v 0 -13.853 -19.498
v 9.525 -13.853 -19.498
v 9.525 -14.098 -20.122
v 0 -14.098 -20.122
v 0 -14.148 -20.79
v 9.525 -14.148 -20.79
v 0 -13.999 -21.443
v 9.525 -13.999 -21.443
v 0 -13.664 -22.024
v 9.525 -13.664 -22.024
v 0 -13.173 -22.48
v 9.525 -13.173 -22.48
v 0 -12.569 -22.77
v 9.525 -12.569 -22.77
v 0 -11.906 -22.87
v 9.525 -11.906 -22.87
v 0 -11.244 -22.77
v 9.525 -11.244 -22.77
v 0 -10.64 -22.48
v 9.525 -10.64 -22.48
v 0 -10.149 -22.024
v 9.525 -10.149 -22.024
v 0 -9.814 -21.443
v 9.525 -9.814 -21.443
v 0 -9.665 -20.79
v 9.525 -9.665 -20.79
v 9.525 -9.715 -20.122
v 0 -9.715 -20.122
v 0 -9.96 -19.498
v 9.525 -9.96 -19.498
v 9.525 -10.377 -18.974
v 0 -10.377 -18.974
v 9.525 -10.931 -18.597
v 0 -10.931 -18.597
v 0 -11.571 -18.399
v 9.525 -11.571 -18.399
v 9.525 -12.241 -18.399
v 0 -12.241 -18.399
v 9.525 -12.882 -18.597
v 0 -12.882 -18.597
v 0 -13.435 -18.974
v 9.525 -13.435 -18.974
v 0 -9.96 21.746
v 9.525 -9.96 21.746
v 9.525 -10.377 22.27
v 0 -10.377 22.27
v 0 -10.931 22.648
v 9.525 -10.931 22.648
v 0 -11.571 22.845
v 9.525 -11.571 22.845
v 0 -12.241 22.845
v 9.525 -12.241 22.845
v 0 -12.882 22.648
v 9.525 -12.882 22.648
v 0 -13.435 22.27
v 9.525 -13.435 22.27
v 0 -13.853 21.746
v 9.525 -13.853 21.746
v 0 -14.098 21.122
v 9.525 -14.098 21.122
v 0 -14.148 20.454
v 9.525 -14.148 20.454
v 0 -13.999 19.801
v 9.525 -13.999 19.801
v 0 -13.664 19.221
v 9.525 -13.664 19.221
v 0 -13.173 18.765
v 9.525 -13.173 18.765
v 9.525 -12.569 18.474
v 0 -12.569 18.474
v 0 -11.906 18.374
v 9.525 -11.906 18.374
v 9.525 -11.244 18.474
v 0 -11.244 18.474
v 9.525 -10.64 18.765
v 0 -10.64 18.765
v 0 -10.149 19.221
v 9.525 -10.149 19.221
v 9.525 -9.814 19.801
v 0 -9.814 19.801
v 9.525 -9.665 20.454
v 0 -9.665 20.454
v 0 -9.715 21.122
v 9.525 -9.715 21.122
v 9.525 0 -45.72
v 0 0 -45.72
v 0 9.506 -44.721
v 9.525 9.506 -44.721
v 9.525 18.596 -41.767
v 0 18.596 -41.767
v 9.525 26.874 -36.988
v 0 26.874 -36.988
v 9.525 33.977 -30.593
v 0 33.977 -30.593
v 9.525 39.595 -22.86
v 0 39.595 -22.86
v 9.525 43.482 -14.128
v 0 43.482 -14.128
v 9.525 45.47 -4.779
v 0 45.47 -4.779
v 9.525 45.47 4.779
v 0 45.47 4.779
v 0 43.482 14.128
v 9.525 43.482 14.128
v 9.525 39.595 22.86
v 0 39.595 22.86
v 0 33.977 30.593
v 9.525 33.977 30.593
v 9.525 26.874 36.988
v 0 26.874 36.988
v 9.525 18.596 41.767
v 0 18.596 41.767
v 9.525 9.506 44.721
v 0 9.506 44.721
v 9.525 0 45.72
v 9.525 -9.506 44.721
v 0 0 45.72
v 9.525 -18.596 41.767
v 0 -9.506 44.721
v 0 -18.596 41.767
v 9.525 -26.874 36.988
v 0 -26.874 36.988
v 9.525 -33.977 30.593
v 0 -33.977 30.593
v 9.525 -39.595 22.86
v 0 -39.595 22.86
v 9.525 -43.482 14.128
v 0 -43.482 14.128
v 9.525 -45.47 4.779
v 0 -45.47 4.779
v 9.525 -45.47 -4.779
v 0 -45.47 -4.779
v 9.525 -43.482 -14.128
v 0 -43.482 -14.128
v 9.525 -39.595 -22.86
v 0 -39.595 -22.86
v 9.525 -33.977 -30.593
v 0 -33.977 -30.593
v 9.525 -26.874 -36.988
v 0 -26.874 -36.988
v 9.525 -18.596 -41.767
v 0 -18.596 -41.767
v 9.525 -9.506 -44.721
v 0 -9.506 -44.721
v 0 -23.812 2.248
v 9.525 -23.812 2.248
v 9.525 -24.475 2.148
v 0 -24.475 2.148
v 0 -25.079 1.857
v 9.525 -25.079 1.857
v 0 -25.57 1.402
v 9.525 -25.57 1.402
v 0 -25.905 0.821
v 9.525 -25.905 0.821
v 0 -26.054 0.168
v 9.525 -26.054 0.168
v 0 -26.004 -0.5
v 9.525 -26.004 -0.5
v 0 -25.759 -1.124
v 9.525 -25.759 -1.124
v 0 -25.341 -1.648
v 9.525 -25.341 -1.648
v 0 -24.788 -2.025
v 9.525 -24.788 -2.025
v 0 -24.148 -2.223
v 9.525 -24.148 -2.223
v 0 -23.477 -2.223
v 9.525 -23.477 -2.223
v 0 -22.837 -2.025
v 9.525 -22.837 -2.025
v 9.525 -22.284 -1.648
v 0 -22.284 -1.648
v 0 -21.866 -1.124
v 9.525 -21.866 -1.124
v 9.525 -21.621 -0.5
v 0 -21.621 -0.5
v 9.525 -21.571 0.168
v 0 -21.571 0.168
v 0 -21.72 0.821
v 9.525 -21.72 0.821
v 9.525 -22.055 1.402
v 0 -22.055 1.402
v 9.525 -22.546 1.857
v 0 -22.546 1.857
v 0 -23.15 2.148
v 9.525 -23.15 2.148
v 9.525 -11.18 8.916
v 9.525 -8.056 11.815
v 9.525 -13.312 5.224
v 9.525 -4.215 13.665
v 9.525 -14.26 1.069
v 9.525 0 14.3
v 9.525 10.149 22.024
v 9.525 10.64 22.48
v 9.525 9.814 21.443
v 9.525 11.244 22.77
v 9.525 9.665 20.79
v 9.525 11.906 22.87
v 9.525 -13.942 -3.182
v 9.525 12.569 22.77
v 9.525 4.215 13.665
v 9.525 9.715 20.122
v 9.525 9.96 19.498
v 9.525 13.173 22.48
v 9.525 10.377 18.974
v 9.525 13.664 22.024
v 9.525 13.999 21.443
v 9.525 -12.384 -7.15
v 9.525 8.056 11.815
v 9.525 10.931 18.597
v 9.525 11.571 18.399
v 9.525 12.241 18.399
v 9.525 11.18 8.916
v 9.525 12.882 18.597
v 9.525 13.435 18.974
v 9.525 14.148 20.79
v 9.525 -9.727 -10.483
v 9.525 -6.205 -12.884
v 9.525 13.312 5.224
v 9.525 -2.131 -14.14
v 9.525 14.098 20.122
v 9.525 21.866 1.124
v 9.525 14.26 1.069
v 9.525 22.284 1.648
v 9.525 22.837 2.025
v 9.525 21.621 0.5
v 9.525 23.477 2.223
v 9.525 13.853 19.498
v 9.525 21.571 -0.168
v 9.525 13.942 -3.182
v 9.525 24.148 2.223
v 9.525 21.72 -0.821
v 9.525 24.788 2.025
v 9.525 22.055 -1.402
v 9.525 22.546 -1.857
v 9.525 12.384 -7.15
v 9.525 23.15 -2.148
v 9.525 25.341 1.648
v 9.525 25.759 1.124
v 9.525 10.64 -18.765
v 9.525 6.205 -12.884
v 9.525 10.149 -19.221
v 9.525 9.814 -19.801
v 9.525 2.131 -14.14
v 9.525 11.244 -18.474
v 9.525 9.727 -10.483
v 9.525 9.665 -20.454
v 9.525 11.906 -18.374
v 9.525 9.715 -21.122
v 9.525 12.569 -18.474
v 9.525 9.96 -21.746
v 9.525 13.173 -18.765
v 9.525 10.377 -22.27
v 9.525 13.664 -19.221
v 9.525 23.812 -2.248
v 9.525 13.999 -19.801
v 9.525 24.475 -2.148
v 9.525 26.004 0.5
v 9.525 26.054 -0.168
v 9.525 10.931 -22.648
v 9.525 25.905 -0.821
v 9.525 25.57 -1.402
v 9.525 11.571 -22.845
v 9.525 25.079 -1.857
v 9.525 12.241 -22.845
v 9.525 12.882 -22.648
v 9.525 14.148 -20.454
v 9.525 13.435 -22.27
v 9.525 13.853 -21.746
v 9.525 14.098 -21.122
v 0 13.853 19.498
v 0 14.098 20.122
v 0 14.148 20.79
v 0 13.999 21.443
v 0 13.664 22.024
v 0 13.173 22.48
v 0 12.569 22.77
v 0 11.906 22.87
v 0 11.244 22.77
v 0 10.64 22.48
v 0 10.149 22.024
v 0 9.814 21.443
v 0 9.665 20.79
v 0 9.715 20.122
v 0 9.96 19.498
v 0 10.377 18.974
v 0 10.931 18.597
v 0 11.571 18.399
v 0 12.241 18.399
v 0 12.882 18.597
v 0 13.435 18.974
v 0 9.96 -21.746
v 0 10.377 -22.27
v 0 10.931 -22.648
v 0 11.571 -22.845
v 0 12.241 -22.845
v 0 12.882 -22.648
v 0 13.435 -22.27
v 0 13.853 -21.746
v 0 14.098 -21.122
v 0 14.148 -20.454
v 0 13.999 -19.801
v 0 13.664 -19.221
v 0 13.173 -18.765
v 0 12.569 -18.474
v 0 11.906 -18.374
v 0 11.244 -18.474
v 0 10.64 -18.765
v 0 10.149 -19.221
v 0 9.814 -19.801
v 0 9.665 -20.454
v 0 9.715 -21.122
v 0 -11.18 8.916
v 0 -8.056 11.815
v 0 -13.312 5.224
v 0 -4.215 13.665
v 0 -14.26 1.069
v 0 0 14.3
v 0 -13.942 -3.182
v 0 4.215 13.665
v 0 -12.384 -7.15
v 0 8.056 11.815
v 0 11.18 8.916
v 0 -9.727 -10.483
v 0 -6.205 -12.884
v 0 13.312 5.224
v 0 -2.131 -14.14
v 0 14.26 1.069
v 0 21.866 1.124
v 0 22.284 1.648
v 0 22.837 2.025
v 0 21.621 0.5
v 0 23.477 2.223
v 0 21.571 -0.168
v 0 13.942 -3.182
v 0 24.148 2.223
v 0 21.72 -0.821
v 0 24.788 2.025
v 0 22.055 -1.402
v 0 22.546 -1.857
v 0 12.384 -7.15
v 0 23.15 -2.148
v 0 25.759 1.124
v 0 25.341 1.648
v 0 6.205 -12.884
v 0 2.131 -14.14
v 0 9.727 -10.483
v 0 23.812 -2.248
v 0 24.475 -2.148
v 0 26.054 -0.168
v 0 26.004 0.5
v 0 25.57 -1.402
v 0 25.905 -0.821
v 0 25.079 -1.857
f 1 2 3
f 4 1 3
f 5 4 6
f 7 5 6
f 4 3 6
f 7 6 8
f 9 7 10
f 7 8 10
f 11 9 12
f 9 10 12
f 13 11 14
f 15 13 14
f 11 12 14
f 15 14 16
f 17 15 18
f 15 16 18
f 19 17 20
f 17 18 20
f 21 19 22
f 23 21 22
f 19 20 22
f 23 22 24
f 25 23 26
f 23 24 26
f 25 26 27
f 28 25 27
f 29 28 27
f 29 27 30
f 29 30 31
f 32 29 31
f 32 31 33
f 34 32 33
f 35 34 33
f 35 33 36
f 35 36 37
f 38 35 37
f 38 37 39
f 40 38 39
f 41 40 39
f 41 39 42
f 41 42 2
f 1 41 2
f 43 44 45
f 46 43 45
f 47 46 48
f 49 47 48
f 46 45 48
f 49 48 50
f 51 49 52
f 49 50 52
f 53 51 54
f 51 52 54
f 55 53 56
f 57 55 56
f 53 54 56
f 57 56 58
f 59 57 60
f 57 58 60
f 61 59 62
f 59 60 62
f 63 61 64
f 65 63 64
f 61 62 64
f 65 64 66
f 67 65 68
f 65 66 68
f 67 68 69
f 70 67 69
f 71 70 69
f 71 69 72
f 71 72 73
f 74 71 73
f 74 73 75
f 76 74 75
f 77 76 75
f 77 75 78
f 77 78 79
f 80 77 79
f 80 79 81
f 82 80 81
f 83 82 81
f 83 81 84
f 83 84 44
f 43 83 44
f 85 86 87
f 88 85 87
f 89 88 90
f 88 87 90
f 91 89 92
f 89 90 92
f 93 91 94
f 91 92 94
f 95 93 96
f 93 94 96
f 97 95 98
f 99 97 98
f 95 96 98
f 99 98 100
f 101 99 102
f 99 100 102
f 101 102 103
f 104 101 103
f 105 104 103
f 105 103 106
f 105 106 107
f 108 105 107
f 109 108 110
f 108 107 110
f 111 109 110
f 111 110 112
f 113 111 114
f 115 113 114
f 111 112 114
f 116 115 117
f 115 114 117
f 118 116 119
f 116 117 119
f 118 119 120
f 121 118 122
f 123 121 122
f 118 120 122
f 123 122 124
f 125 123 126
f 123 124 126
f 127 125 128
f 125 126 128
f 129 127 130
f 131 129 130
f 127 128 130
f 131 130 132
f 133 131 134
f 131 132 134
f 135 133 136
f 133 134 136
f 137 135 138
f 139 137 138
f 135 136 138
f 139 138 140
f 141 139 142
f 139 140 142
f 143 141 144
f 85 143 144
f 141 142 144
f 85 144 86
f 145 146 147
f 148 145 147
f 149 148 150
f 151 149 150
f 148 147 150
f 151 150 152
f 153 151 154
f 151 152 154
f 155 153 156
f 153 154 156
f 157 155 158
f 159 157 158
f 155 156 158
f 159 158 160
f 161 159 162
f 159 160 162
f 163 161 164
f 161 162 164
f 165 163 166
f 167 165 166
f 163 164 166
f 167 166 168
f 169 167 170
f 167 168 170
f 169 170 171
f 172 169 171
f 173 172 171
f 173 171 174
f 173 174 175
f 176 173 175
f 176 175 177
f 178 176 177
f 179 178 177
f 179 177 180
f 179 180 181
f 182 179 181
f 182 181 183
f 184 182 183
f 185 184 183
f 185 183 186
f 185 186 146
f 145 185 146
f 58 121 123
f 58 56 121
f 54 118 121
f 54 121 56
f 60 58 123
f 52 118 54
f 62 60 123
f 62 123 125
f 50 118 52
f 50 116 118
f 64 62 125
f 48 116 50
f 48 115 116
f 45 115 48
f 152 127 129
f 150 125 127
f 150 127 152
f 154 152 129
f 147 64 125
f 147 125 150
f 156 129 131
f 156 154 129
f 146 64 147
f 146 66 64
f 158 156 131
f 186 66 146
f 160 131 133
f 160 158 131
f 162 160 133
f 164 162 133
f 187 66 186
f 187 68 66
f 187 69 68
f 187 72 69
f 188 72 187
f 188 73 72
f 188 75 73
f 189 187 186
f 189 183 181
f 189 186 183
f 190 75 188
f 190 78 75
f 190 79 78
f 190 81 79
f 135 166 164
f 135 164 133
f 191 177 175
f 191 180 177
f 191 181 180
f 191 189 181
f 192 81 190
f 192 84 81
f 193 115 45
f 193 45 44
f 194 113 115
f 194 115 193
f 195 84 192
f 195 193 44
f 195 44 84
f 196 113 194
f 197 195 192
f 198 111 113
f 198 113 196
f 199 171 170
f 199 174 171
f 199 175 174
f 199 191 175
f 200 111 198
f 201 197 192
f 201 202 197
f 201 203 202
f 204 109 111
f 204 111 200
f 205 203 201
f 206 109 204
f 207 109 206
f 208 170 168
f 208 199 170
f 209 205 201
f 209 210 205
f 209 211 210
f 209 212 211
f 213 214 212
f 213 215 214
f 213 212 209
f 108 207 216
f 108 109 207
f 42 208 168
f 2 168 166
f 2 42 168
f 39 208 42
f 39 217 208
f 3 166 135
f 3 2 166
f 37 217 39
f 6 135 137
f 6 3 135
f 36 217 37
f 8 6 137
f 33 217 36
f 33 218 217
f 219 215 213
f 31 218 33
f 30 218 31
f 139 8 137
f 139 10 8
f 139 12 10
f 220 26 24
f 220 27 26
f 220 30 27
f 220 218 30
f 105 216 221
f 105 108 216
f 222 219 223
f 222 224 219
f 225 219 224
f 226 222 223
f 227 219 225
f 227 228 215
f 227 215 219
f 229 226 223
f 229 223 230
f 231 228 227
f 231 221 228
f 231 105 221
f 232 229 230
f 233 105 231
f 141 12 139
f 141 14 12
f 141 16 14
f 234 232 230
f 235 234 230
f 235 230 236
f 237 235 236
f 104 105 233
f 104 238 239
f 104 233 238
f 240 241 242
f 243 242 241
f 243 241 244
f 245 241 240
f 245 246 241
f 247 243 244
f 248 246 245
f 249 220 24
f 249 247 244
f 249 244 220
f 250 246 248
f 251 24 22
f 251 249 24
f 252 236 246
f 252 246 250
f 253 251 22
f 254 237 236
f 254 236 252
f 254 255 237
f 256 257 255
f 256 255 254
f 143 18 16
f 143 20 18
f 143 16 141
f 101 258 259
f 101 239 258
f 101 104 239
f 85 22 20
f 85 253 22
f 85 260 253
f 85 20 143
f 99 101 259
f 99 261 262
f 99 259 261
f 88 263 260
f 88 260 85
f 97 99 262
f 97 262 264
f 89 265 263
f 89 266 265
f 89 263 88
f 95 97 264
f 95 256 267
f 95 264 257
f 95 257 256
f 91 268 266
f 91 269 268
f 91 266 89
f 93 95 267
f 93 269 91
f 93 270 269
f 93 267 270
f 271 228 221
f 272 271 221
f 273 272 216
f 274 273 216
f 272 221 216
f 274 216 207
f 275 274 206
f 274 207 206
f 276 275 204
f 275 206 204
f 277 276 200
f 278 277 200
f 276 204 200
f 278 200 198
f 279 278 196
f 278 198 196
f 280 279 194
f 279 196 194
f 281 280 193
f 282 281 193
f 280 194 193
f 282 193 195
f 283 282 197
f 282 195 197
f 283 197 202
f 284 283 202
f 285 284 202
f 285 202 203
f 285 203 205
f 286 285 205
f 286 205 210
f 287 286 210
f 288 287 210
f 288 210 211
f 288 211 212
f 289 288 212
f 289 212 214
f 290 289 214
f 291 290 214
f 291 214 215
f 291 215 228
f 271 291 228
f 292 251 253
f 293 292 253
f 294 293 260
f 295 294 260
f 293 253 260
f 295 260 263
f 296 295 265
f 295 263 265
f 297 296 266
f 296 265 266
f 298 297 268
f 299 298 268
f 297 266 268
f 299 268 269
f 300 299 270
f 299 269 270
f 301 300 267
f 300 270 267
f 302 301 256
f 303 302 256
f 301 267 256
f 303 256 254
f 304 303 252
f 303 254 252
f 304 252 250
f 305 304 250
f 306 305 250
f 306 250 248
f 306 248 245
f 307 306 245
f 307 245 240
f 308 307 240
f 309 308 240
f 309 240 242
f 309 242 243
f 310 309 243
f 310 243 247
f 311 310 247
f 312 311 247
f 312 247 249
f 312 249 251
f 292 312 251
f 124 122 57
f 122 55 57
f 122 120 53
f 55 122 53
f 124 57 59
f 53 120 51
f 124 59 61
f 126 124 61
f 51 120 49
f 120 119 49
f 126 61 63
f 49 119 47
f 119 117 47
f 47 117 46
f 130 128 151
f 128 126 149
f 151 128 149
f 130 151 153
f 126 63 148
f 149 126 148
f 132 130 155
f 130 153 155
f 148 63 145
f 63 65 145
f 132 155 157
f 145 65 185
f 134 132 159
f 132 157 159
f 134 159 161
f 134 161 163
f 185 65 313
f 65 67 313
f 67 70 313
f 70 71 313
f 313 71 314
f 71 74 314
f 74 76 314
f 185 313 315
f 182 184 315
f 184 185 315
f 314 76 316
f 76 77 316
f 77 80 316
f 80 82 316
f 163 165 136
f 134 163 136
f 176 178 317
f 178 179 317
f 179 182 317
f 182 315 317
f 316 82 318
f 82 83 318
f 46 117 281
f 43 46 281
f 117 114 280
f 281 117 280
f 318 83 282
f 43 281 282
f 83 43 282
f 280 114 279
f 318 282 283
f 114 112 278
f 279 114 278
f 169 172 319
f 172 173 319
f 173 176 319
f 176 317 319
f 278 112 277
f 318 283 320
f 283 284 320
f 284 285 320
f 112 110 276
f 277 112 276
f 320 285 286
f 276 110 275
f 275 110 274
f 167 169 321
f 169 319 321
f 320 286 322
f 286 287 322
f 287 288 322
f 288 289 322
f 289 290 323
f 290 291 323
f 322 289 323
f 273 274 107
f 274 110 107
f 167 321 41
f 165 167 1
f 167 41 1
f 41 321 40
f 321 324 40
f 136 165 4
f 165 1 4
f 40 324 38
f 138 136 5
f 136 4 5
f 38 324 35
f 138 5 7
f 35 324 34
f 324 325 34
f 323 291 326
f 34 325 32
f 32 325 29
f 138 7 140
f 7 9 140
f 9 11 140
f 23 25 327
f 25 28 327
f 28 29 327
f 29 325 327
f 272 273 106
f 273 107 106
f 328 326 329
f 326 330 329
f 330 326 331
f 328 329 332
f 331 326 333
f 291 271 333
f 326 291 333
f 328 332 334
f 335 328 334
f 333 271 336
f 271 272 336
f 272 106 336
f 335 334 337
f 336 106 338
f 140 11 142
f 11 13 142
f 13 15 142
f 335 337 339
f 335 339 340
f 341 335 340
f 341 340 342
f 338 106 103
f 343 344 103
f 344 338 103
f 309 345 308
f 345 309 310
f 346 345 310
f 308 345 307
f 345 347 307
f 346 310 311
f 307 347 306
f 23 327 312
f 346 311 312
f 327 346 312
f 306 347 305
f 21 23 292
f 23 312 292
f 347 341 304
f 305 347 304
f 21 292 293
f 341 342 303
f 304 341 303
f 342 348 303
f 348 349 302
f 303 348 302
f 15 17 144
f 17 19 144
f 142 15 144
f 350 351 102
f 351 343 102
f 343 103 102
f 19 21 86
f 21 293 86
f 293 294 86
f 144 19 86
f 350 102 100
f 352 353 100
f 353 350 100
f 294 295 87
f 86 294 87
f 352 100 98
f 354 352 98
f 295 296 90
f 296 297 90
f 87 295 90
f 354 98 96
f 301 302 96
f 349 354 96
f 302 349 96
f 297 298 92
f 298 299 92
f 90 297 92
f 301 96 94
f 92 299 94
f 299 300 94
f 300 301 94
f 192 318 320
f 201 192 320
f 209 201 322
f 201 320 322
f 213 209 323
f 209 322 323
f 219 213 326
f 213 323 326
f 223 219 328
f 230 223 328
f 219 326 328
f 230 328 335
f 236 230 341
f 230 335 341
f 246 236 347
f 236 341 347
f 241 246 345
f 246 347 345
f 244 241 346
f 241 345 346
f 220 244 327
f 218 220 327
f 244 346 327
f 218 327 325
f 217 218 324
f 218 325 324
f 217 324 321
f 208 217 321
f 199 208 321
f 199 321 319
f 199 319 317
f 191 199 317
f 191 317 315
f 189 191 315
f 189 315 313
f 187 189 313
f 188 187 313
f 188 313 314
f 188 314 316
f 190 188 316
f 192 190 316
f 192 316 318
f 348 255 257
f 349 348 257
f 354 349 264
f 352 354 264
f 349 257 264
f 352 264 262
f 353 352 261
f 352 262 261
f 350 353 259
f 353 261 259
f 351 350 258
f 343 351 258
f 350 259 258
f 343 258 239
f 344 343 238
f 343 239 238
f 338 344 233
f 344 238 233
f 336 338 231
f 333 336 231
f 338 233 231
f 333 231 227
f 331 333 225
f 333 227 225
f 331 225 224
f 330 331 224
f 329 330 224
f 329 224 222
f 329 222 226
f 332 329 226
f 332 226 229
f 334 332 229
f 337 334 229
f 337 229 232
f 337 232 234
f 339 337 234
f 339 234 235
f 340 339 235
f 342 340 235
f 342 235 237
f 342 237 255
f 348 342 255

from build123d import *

# Parameters (mm, degrees)
SKETCH1_R             = 45.72
BOSS_EXTRUDE1_DEPTH   = 9.525
SKETCH2_R             = 14.3002
CUT_EXTRUDE1_DEPTH    = 10.525
F_8_CLEARANCE_HOLE1_D = 4.4958
CIRPATTERN1_COUNT     = 6


with BuildPart() as part:
    # Sketch1 → Boss-Extrude1 (new body)
    with BuildSketch(Plane(origin=(0, 0, 0), x_dir=(0, 0, -1), z_dir=(1, 0, 0))):
        Circle(SKETCH1_R)
    extrude(amount=BOSS_EXTRUDE1_DEPTH)

    # Sketch2 → Cut-Extrude1 (cut, through all)
    with BuildSketch(Plane.ZY):
        Circle(SKETCH2_R)
    extrude(amount=-CUT_EXTRUDE1_DEPTH, mode=Mode.SUBTRACT)

    # #8 Clearance Hole1 (through all)
    with Locations(Plane.ZY):
        with Locations((0, 23.8125)):
            f_8_clearance_hole1 = Hole(F_8_CLEARANCE_HOLE1_D / 2)

    # CirPattern1: #8 Clearance Hole1 ×6 about axis
    cirpattern1_axis = Axis((0, 0, 0), (1, 0, 0))
    for i in range(1, CIRPATTERN1_COUNT):
        add(f_8_clearance_hole1.rotate(cirpattern1_axis, i * 360 / CIRPATTERN1_COUNT), mode=Mode.SUBTRACT)


solid = part.part
